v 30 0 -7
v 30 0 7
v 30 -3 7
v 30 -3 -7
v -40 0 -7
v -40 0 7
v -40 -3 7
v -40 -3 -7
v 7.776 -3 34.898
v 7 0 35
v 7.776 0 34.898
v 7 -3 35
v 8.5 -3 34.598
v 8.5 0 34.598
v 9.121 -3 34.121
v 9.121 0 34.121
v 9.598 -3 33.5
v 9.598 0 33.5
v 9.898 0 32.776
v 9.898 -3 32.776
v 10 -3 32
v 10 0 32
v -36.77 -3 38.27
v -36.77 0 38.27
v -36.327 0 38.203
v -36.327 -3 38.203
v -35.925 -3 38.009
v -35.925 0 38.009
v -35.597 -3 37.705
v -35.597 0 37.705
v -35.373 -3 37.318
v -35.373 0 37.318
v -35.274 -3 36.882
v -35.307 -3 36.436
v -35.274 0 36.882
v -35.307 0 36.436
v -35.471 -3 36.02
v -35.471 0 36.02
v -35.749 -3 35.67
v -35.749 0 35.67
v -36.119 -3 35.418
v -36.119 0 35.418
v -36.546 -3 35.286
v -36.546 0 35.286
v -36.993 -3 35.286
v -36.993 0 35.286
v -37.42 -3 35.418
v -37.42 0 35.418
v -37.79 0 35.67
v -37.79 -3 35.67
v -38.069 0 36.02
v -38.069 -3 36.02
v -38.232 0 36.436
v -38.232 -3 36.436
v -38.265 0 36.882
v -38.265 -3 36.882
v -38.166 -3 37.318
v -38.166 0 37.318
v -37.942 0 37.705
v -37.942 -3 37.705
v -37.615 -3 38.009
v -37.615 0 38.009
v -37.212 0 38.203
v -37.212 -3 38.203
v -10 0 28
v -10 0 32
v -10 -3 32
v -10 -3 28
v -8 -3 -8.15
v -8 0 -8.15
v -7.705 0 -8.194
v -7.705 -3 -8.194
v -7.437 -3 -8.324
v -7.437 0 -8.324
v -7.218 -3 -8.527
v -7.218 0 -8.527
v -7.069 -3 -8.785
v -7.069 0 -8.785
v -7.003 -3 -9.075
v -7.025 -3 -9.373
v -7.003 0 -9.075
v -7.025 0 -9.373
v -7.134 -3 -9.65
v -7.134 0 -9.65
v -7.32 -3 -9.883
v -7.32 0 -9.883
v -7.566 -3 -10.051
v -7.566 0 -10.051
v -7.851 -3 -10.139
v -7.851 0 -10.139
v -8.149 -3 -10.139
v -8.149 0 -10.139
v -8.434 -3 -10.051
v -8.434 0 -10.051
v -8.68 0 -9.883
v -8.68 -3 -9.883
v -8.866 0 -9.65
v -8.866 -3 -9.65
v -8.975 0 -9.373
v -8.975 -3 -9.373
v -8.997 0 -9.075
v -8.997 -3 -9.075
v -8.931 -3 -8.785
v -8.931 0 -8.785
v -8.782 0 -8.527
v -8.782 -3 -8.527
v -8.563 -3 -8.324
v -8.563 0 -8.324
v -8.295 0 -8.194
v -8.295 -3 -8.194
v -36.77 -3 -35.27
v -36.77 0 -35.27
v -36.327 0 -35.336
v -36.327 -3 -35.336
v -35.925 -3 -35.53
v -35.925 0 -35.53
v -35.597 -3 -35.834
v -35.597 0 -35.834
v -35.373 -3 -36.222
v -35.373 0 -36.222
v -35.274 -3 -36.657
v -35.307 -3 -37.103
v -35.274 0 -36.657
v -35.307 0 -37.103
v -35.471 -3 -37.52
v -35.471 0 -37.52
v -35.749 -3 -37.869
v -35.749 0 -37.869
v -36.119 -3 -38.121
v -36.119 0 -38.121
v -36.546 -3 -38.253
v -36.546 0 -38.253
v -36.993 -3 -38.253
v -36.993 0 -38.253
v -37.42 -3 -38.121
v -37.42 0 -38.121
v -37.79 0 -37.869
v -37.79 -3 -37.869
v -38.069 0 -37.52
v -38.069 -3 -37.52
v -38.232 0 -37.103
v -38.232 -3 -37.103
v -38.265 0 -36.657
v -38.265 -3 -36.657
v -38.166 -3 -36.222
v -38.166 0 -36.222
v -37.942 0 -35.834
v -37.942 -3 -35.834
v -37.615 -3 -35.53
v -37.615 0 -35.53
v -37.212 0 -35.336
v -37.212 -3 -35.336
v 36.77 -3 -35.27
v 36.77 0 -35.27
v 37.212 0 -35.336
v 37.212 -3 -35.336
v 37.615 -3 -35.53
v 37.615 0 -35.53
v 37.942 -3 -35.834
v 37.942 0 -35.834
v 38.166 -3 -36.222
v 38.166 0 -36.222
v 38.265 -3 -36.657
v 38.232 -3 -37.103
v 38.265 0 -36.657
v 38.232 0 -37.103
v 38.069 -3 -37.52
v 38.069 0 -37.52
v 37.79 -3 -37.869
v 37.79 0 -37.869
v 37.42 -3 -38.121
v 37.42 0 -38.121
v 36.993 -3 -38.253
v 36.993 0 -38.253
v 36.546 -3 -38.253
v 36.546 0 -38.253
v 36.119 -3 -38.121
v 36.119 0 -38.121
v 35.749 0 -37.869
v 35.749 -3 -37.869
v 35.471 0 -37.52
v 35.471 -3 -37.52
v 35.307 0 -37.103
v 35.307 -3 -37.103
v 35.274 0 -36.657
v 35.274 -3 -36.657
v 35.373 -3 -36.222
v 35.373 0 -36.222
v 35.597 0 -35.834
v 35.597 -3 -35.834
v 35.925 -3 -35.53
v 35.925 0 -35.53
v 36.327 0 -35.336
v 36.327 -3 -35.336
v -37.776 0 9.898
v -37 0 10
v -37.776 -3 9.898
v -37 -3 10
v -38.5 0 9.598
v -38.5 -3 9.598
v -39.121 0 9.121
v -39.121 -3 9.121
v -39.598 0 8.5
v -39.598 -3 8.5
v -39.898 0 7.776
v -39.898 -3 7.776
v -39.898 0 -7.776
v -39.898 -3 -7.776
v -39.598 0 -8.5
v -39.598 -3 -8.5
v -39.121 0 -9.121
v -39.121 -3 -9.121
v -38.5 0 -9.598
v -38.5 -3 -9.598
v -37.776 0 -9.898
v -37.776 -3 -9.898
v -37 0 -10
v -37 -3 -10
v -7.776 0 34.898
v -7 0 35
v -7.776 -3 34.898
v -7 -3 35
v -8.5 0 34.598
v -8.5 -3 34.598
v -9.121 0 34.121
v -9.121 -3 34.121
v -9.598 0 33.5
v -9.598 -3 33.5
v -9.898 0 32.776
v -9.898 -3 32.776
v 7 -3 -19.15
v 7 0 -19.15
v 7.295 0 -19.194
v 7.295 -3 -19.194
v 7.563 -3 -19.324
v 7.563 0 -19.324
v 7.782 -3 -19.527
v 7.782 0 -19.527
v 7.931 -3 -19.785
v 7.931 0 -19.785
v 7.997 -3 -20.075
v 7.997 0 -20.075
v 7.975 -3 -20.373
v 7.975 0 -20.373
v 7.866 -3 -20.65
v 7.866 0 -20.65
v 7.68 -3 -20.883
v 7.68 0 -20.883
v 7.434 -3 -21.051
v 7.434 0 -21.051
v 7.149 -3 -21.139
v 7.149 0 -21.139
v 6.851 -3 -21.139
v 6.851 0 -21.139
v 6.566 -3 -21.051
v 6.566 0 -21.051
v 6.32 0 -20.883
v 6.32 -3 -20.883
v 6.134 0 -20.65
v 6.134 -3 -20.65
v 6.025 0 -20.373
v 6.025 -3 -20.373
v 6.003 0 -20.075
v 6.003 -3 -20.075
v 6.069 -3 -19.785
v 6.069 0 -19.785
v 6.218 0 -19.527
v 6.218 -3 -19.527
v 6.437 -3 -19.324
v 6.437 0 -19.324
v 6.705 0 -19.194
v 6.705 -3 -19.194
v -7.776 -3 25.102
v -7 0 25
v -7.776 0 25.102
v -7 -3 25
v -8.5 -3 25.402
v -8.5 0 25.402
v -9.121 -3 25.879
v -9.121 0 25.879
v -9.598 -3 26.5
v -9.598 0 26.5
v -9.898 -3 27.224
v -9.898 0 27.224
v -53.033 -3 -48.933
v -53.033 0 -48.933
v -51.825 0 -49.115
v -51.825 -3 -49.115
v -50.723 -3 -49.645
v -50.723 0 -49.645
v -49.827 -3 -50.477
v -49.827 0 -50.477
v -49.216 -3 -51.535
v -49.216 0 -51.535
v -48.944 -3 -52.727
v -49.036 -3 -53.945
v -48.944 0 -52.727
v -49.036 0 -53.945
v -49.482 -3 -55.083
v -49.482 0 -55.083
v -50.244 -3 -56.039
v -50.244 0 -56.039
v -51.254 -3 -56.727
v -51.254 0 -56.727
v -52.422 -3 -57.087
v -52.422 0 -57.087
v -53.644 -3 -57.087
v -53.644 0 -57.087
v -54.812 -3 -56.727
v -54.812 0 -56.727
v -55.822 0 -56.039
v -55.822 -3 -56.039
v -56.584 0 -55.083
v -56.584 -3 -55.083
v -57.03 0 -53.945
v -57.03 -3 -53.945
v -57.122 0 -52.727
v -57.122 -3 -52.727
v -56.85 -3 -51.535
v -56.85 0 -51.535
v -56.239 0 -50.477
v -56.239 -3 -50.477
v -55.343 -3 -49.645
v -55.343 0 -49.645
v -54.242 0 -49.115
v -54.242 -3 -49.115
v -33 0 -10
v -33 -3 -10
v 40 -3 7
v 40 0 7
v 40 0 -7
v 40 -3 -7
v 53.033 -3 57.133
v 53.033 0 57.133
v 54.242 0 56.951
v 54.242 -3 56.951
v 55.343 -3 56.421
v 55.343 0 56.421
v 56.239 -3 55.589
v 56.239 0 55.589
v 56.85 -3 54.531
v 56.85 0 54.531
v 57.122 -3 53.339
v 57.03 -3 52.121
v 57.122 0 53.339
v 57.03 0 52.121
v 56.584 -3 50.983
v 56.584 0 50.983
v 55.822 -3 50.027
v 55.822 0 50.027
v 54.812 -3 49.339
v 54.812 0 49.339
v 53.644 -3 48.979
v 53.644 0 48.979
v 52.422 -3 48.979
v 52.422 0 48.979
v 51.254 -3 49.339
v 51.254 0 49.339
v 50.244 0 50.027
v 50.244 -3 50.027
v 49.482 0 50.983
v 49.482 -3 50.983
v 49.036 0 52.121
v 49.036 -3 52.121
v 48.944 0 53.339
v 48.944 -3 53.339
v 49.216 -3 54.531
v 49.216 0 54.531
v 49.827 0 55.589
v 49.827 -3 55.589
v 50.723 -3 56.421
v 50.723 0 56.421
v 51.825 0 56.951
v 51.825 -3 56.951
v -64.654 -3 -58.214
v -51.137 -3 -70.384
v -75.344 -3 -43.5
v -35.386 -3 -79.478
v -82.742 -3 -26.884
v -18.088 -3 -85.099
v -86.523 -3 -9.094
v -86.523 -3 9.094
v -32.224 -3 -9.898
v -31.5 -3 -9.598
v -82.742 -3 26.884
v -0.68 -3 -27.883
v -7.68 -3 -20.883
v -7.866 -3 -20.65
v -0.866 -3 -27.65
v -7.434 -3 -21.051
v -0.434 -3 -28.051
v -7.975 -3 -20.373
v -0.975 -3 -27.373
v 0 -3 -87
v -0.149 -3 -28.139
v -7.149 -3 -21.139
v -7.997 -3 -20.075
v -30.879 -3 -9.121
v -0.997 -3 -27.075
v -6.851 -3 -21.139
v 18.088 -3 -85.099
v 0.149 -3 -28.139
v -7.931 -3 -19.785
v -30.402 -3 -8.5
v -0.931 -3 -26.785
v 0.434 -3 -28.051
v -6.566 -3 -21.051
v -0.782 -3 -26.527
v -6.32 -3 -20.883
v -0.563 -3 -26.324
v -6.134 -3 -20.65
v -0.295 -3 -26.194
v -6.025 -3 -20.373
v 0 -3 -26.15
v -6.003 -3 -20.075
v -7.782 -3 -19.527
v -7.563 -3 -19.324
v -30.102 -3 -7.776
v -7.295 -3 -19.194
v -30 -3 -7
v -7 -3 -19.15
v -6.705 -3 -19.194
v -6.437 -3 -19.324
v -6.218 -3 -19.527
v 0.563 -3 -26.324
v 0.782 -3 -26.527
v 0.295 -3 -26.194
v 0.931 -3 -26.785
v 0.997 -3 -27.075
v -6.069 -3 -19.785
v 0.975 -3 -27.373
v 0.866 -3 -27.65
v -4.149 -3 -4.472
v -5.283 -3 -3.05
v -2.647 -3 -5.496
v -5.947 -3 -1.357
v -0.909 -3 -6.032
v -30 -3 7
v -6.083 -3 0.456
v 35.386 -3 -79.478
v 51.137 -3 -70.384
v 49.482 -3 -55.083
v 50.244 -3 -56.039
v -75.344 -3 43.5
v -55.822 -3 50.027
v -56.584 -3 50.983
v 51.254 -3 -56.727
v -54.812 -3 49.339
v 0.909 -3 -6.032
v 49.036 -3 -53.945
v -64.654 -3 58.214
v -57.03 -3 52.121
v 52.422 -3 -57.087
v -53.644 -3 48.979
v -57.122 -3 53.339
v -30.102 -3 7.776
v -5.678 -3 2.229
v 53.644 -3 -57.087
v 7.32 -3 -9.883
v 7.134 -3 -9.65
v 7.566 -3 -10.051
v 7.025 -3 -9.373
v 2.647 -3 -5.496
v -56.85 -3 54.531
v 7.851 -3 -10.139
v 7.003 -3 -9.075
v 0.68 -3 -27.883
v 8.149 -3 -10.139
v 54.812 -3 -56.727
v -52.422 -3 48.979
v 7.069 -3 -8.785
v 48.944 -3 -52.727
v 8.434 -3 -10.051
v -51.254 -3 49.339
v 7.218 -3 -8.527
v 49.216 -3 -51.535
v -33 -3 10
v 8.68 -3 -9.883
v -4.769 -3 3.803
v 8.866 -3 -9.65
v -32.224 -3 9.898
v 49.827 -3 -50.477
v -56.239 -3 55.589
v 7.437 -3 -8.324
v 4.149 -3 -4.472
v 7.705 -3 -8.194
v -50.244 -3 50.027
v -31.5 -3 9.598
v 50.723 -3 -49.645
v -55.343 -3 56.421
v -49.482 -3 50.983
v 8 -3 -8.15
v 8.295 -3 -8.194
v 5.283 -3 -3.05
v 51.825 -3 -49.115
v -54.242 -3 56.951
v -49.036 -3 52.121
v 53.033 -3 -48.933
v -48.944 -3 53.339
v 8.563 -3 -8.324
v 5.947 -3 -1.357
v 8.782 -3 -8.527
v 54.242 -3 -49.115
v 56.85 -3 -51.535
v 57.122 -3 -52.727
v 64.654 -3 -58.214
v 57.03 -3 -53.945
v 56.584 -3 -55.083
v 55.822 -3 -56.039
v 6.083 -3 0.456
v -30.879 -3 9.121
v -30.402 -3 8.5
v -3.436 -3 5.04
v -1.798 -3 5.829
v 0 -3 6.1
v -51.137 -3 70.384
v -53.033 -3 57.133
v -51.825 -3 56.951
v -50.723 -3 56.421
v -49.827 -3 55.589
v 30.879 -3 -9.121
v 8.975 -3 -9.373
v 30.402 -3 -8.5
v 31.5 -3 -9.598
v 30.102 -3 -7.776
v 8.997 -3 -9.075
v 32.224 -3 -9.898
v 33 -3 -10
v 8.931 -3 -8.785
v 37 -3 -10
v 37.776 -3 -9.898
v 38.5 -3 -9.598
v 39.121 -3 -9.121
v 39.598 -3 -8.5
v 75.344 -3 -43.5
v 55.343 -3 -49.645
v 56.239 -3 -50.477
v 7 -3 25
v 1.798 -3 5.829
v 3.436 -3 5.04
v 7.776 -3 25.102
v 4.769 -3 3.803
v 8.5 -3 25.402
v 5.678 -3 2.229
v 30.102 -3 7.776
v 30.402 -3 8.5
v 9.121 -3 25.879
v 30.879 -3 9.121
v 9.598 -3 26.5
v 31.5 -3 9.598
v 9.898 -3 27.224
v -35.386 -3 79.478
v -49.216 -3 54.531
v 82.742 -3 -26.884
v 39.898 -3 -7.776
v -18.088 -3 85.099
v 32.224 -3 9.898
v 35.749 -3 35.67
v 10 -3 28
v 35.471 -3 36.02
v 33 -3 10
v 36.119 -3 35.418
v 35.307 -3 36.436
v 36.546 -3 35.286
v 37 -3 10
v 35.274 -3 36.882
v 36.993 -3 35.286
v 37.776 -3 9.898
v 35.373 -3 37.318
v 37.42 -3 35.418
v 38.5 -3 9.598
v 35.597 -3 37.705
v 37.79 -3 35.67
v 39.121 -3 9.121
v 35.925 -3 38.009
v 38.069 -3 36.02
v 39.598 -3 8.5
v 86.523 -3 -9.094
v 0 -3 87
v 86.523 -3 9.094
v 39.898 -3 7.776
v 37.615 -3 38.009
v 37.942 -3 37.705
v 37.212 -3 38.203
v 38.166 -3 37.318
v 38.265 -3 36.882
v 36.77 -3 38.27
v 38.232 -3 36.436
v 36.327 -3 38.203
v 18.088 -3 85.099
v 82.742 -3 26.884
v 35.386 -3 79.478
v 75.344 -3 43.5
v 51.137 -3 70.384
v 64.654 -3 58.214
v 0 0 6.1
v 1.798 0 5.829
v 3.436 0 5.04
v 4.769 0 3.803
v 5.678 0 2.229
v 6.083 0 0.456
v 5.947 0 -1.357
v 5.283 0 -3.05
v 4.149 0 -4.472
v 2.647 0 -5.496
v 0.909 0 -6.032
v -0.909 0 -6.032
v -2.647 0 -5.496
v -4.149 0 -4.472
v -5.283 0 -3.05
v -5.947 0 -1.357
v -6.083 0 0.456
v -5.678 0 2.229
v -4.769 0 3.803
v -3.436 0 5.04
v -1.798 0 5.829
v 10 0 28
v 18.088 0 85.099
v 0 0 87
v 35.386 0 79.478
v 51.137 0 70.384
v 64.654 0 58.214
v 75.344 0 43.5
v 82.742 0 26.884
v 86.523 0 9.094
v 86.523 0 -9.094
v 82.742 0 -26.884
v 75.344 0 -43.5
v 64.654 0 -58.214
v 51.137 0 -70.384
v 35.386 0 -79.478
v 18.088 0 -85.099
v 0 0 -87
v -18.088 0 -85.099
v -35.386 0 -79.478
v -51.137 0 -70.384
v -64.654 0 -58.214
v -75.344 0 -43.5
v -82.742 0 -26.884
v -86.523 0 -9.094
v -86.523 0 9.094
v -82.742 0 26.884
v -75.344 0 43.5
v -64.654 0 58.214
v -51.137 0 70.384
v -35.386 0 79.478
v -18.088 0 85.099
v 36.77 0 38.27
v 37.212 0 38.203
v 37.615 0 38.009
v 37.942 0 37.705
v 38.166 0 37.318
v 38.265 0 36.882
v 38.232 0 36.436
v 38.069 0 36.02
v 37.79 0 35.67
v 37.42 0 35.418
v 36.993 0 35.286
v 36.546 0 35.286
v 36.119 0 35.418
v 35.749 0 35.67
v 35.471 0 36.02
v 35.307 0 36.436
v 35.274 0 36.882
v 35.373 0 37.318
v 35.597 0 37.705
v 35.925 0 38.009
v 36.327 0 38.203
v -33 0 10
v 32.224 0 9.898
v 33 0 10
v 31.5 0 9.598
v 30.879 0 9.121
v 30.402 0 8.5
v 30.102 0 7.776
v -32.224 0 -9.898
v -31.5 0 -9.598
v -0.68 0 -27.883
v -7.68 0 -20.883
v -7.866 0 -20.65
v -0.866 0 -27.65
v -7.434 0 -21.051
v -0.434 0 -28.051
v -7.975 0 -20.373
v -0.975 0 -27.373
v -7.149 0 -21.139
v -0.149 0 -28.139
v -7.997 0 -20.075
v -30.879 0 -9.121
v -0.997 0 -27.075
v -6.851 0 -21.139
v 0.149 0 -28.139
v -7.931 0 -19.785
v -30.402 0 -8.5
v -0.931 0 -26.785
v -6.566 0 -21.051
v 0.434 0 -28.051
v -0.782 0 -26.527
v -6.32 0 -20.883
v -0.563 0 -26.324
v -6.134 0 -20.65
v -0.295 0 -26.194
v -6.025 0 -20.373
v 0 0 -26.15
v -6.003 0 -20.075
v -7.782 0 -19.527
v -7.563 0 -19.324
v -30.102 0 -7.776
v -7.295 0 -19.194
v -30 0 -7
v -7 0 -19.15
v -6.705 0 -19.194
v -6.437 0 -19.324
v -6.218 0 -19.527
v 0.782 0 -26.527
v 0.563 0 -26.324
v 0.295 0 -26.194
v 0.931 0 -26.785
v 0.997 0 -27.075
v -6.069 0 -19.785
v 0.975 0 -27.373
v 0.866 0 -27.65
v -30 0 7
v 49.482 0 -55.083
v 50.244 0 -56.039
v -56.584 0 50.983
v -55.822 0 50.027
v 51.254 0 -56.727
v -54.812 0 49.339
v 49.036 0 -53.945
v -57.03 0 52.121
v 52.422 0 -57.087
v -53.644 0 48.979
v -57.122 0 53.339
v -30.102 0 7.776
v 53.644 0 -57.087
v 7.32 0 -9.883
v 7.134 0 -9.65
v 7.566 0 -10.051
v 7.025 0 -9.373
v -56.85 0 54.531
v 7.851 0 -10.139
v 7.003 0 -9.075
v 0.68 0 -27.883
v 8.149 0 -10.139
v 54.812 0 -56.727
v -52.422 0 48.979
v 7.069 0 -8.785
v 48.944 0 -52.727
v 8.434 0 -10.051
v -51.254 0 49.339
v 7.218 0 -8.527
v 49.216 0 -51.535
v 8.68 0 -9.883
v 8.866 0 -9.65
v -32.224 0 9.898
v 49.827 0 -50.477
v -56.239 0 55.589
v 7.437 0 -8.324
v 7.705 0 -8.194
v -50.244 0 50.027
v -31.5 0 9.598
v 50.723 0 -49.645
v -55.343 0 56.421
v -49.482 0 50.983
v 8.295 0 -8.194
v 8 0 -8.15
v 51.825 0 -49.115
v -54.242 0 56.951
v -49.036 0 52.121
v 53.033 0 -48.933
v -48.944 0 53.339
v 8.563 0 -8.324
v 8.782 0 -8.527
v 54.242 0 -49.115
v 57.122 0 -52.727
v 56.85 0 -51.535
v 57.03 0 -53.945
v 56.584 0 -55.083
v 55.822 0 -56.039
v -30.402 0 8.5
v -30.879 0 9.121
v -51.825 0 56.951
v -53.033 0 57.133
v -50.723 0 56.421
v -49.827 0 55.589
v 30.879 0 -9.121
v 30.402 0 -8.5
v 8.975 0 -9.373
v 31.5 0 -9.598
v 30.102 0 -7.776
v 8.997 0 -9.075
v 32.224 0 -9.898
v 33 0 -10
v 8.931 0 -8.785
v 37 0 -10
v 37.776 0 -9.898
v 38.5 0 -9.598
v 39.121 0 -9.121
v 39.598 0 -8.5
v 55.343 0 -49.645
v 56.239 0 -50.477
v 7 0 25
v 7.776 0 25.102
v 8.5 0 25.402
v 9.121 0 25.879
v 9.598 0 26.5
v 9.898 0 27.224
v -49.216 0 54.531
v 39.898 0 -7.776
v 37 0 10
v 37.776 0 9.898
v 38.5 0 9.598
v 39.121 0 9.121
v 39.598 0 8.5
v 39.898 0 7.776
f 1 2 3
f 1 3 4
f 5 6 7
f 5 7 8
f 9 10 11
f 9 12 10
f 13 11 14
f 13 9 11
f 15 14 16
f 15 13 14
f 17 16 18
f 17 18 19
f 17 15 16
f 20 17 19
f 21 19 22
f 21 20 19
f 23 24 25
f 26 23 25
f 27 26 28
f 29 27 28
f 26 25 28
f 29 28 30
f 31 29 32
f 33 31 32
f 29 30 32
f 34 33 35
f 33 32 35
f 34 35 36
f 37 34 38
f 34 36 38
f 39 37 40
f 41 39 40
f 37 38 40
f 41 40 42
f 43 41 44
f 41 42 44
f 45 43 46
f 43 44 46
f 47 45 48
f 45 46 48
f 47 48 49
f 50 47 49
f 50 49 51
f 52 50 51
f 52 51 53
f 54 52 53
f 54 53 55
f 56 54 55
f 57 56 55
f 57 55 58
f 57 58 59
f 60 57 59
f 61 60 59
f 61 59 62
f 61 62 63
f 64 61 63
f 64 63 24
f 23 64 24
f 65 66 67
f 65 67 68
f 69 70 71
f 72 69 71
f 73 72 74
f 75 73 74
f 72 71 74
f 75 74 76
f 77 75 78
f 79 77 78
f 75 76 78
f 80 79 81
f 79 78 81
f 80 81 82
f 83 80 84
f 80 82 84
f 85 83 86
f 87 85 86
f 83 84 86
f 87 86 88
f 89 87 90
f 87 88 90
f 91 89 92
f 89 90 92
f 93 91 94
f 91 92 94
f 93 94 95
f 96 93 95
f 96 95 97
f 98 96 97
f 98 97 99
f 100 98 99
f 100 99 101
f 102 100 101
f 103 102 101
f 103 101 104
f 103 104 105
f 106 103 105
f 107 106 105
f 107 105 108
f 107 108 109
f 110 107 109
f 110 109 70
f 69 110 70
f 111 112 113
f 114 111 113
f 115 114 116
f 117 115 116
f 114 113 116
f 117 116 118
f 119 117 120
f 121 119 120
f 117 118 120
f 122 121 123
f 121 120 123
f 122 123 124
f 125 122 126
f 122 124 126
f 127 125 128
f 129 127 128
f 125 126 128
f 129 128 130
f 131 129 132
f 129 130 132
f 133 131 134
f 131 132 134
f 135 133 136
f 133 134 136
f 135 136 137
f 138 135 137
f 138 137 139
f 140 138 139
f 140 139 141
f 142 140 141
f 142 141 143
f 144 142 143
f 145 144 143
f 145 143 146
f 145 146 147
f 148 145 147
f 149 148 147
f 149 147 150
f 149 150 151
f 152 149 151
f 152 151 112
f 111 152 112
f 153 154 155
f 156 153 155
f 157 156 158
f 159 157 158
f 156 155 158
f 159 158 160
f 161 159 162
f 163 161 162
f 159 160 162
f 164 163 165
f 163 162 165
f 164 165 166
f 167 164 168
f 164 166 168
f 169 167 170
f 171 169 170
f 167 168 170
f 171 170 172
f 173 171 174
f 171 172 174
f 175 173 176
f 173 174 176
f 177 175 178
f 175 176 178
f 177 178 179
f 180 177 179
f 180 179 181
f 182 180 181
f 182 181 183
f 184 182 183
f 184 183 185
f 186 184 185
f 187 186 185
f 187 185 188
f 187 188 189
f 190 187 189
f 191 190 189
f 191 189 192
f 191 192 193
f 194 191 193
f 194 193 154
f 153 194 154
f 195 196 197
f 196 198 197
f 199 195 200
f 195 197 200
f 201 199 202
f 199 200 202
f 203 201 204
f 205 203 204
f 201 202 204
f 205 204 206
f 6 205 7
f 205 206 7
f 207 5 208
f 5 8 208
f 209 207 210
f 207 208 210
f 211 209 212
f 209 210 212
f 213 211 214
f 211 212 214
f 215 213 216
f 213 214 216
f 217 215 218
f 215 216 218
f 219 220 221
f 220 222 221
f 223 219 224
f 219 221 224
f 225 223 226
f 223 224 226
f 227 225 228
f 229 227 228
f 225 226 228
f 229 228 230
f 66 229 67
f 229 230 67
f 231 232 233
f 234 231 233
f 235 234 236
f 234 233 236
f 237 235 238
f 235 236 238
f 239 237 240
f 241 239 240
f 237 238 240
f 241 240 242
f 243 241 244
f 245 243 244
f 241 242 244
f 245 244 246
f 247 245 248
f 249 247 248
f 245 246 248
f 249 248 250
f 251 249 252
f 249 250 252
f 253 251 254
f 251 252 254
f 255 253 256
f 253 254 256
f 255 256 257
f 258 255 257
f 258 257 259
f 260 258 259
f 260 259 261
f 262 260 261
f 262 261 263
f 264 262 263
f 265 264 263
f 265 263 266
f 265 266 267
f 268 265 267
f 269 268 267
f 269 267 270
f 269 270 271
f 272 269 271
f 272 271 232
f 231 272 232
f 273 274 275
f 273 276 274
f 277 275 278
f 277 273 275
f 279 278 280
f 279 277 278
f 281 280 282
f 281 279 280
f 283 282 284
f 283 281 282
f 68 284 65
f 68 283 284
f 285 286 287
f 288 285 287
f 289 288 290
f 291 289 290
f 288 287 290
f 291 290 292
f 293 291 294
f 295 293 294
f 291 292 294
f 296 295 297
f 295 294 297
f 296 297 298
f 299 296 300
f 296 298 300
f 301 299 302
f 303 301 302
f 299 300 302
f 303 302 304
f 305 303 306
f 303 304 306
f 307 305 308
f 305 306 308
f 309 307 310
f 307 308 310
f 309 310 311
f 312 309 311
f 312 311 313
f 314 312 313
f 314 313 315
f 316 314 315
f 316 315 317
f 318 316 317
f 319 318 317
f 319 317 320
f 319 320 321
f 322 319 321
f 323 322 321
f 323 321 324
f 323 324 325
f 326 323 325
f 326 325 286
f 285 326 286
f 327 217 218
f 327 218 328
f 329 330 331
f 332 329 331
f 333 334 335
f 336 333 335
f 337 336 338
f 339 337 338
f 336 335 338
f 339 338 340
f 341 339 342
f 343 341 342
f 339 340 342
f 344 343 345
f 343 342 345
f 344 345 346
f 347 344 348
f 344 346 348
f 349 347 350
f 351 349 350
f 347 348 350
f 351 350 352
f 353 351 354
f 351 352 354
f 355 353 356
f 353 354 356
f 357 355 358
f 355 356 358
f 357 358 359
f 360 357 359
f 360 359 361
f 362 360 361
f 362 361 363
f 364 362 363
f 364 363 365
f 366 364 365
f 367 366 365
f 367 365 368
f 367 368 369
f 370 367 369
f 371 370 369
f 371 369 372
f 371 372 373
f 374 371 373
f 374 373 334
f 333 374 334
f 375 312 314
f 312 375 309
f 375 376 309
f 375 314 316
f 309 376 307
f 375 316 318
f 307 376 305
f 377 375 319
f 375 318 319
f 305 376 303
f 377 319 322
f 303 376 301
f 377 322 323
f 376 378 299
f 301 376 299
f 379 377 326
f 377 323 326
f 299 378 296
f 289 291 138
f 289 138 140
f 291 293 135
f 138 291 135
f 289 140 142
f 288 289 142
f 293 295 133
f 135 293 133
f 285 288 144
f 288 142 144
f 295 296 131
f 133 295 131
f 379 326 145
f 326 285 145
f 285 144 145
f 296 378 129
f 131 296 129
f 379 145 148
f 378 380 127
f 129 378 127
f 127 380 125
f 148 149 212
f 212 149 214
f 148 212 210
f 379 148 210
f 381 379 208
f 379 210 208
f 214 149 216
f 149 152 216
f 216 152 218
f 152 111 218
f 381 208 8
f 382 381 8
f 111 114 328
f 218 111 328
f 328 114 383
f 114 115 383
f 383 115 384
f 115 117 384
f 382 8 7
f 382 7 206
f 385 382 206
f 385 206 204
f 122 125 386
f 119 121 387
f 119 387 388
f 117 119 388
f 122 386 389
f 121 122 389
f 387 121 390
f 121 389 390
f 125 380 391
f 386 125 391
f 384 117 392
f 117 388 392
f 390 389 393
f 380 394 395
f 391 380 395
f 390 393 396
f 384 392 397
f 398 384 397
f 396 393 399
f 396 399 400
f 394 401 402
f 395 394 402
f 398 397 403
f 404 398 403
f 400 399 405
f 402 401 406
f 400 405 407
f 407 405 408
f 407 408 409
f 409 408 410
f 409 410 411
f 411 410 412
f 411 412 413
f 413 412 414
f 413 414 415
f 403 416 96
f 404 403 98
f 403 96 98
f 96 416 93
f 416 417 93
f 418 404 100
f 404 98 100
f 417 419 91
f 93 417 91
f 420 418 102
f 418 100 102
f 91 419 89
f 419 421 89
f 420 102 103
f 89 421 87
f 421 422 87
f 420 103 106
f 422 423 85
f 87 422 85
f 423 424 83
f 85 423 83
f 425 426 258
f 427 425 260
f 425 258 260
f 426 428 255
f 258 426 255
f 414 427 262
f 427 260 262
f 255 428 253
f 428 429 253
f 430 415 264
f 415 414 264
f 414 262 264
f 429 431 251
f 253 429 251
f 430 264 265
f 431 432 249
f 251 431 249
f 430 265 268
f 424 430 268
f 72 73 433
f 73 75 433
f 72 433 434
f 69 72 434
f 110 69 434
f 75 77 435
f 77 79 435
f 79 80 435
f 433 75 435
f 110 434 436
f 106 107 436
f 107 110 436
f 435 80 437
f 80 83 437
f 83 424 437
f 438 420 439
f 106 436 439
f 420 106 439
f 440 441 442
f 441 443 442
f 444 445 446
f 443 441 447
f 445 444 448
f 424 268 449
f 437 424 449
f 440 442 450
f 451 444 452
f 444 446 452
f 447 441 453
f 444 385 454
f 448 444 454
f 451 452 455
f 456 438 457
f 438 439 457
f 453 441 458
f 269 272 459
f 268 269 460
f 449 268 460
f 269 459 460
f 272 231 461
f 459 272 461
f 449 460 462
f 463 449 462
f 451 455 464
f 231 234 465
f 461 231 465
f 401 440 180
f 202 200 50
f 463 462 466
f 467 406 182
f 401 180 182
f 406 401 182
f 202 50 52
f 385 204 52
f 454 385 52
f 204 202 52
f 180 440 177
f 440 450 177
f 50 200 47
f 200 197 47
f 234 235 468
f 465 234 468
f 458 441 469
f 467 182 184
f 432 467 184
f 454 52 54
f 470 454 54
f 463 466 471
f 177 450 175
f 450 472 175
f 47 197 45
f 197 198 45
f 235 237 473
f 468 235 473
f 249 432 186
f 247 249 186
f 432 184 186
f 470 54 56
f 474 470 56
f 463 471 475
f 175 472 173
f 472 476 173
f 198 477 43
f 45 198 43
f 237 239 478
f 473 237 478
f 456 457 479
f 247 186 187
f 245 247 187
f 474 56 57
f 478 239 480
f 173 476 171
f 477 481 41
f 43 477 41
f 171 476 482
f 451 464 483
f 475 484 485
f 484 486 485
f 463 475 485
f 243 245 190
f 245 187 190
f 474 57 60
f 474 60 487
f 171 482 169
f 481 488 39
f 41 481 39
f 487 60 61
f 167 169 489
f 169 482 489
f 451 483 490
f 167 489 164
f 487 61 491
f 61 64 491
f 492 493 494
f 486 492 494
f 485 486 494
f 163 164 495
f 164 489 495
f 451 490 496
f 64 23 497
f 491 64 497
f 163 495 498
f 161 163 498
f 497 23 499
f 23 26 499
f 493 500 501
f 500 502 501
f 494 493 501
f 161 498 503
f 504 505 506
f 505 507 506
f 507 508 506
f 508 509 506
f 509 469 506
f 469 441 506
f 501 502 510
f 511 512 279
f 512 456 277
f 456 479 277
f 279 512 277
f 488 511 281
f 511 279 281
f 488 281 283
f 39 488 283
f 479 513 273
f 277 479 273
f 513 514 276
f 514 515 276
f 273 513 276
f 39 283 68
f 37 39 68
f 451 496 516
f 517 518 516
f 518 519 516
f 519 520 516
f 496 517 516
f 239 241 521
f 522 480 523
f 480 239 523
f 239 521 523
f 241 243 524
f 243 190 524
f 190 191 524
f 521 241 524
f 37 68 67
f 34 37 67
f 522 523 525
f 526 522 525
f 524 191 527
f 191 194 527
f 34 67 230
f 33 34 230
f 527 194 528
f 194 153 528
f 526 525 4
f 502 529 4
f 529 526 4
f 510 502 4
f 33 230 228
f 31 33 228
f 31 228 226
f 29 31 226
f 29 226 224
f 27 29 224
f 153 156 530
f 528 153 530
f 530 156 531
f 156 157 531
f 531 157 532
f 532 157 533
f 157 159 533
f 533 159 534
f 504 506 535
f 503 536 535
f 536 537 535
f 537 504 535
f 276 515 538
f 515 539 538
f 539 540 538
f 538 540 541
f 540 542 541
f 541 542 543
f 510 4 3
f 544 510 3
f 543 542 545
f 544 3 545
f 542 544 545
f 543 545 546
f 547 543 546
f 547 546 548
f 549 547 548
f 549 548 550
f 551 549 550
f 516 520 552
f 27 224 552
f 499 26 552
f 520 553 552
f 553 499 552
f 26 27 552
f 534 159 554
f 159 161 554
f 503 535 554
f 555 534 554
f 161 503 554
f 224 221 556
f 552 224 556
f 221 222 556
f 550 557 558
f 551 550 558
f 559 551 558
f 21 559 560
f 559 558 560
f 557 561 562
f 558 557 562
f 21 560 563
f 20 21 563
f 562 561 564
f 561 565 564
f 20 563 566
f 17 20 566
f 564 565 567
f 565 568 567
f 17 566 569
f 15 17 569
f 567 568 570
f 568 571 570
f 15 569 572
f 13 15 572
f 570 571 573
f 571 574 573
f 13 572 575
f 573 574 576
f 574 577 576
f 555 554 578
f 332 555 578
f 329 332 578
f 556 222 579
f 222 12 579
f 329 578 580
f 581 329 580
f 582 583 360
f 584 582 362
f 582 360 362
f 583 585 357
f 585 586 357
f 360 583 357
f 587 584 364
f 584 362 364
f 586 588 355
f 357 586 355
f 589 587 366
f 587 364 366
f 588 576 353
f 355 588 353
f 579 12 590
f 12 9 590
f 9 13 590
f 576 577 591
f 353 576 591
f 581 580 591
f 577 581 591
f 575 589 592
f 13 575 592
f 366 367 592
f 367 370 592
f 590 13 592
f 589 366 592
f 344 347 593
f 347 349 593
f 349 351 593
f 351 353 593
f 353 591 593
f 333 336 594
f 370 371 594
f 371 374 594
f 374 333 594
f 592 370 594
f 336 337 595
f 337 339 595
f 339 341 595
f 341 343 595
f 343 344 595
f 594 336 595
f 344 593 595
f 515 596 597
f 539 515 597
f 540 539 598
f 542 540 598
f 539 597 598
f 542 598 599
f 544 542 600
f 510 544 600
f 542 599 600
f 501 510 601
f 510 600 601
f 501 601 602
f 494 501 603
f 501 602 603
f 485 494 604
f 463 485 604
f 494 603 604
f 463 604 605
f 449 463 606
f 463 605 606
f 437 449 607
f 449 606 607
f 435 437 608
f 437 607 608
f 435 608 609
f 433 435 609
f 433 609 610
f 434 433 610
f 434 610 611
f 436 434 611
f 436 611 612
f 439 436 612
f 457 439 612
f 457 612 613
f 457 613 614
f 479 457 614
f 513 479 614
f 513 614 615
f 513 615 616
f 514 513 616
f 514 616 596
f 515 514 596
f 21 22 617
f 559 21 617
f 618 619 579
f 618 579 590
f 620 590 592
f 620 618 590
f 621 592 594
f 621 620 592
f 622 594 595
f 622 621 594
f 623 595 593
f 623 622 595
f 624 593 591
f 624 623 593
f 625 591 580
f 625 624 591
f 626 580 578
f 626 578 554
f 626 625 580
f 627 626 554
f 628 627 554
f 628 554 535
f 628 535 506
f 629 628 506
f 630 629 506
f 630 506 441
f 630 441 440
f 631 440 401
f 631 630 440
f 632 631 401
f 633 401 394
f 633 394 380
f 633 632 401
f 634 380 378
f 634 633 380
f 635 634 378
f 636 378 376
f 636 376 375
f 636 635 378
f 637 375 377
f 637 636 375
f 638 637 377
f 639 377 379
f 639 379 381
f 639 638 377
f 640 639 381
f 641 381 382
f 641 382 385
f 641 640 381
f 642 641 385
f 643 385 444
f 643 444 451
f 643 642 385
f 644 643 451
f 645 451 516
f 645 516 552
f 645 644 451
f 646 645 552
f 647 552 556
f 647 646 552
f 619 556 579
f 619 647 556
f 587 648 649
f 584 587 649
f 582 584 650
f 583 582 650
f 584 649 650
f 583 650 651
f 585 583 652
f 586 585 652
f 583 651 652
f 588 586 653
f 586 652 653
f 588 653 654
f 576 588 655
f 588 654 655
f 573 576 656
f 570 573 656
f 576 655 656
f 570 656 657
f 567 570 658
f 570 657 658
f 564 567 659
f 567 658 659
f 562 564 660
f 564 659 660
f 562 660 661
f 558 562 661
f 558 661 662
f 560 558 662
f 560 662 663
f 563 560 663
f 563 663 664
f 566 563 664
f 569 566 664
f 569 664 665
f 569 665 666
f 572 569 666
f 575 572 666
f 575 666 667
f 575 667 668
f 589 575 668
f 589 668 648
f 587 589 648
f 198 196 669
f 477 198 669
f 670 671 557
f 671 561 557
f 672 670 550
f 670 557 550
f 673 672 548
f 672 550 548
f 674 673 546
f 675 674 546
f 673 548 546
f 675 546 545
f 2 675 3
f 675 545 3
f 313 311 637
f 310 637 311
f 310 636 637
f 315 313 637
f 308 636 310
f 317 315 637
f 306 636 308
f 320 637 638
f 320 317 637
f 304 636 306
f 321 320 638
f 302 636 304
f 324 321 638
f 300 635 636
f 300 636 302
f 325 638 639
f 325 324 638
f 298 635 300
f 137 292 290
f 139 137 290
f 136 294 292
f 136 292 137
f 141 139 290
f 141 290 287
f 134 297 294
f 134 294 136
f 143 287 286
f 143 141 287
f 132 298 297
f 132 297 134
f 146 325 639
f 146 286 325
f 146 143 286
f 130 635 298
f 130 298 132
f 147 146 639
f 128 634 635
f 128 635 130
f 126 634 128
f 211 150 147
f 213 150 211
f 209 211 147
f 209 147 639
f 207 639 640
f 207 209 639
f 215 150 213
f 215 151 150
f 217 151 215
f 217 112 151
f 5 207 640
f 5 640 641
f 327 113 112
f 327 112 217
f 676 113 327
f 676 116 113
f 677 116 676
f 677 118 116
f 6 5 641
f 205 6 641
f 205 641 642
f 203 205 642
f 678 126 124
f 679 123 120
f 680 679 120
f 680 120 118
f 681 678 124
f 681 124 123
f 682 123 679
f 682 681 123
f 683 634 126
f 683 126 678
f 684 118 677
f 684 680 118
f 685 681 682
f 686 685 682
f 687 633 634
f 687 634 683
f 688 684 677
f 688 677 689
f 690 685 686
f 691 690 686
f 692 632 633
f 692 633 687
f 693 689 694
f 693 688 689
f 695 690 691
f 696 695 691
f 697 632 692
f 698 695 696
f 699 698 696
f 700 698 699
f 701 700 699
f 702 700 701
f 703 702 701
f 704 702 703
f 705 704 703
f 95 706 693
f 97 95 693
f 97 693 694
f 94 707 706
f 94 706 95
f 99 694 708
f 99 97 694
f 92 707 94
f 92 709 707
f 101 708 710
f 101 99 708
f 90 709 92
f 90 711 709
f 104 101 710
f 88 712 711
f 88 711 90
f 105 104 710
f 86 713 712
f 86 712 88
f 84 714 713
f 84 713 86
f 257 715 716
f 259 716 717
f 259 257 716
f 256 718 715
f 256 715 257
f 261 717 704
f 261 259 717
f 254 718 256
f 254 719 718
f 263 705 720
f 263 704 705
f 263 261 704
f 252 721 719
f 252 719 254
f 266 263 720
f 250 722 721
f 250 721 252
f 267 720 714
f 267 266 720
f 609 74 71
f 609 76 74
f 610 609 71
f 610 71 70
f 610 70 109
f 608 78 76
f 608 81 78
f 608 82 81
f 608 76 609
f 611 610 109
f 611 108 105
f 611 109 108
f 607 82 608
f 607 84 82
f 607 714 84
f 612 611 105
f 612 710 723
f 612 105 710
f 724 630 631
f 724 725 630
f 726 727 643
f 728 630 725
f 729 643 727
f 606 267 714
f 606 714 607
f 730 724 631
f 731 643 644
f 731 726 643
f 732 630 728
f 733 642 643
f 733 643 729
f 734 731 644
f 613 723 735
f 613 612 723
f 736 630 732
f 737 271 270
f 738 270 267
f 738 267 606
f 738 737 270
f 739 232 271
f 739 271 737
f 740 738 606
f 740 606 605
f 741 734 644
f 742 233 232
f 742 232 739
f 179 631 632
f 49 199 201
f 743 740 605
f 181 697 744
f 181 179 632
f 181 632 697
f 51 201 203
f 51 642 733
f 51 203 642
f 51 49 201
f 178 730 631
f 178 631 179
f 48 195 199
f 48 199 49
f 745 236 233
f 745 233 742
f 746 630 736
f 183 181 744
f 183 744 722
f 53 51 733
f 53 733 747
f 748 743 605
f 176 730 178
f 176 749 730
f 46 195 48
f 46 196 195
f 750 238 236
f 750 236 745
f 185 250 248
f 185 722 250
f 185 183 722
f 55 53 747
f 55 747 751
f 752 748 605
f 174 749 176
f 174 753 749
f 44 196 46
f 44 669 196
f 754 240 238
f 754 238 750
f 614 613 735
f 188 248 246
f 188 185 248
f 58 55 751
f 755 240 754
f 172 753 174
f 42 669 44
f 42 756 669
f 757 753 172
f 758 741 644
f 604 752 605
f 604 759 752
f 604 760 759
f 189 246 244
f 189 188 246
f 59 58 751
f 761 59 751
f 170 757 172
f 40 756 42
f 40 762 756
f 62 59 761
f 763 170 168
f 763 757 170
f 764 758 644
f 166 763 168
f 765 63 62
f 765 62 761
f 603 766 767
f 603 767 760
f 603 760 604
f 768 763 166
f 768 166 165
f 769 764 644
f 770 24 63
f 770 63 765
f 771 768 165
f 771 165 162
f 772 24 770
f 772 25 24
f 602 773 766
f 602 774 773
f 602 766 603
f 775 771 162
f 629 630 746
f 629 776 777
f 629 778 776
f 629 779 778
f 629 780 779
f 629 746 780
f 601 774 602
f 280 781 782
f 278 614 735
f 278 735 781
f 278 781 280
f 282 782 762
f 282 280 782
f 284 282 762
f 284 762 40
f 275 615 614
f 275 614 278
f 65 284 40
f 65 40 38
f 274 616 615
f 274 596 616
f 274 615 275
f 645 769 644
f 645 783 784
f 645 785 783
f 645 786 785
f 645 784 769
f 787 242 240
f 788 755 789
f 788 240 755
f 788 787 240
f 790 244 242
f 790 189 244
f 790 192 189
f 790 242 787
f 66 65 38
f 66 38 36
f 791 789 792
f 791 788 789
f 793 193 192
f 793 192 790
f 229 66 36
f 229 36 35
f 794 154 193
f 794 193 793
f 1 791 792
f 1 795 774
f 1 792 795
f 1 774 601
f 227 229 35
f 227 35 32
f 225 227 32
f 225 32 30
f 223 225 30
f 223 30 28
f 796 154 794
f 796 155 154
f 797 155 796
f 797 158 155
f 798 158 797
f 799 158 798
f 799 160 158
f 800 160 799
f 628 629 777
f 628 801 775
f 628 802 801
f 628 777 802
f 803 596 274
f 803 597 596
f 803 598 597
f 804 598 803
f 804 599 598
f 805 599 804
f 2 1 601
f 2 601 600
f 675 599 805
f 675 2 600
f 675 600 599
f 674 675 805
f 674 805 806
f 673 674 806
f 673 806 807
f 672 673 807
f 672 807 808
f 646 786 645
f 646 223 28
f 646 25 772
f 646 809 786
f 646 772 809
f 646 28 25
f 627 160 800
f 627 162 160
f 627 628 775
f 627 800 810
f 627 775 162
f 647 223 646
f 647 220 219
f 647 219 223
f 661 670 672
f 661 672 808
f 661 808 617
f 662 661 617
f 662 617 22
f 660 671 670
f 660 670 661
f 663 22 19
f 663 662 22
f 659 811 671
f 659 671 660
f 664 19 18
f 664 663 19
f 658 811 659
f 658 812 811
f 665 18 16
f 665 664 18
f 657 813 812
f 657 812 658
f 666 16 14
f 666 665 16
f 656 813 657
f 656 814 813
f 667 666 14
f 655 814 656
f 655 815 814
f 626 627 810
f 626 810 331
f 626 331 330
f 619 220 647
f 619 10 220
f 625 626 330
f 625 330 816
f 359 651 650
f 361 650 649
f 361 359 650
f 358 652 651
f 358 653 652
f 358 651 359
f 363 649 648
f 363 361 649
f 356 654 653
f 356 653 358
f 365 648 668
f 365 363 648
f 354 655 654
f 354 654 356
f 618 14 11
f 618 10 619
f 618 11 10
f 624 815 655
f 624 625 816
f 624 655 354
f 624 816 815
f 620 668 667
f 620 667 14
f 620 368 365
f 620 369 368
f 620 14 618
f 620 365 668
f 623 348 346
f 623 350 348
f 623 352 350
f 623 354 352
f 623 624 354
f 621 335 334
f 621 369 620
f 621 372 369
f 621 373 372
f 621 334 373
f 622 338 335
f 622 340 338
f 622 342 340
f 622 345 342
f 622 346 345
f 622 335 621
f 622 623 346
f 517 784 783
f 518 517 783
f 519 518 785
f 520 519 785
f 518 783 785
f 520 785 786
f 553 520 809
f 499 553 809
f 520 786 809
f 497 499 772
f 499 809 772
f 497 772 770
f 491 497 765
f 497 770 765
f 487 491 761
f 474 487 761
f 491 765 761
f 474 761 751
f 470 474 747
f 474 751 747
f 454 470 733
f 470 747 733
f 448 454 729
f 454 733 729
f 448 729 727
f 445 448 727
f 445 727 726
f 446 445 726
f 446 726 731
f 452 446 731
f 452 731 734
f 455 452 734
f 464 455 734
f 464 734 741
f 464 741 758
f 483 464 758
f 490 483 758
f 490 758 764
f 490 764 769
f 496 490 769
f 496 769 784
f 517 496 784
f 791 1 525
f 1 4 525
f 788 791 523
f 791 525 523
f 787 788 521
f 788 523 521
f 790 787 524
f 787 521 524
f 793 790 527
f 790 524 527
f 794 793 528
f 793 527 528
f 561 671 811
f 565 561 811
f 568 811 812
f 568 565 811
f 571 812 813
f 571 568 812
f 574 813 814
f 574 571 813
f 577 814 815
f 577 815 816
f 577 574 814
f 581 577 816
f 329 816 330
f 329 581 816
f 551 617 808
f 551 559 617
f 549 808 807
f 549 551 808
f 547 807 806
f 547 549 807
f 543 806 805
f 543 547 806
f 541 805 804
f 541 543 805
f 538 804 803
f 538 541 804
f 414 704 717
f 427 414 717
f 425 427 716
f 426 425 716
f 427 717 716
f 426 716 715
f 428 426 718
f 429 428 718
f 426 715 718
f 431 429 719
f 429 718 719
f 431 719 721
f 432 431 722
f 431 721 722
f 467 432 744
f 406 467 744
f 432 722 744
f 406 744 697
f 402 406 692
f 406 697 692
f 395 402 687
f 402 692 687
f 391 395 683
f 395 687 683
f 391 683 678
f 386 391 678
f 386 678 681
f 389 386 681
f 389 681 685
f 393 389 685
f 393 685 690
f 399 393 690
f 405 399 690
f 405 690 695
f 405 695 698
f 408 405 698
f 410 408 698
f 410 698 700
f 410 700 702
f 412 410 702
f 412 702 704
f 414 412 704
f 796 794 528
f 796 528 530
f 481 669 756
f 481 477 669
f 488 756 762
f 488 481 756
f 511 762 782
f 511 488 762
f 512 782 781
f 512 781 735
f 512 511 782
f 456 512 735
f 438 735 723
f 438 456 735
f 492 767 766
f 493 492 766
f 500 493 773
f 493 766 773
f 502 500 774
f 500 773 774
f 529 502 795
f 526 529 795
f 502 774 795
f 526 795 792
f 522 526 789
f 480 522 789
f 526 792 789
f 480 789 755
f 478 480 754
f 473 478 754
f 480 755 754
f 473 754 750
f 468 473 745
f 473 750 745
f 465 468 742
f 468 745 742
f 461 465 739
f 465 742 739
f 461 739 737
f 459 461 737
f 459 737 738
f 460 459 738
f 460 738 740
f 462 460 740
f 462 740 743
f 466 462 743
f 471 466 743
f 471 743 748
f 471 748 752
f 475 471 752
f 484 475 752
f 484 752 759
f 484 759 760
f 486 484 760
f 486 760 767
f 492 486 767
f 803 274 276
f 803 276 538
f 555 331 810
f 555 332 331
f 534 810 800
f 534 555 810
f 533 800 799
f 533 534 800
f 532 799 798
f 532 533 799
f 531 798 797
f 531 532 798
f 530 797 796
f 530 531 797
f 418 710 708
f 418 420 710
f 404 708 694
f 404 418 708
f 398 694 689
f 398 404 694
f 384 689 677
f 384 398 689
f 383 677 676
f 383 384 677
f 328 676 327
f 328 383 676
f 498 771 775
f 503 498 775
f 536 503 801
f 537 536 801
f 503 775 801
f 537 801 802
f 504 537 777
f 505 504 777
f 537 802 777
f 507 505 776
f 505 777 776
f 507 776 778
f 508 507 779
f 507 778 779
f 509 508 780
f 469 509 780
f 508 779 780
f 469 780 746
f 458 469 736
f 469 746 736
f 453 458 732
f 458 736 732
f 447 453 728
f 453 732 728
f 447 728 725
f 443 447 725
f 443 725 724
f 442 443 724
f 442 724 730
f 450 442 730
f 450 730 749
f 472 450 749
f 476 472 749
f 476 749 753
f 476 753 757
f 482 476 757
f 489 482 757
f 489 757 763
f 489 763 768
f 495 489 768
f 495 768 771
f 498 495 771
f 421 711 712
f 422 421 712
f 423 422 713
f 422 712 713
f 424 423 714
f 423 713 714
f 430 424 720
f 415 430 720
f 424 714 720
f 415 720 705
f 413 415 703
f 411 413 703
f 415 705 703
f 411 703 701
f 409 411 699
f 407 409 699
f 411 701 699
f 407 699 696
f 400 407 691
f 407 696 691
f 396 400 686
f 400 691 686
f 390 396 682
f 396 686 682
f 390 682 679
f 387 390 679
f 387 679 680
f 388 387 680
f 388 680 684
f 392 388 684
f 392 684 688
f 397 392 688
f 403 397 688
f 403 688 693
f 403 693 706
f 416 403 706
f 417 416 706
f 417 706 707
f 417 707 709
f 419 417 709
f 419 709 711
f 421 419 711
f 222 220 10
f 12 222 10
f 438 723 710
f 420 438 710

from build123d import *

# Parameters (mm, degrees)
SKETCH_1_R             = 87
SM_BASE_FLANGE_1_DEPTH = 3
CUT_EXTRUDE_1_REACH    = 125.073
SKETCH_6_R             = 6.1
SKETCH_6_R_2           = 1
SKETCH_6_R_3           = 4.1
SKETCH_6_R_4           = 1.5
SKETCH_6_W             = 10
SKETCH_6_H             = 20
SKETCH_6_W_2           = 20
SKETCH_6_H_2           = 10
FILLET_1_R             = 3


# Sheet-metal steps are written as plain solids
with BuildPart() as part:
    # Sketch 1 → 基体-法兰1 (new body)
    with BuildSketch(Plane(origin=(0, 0, 0), x_dir=(1, 0, 0), z_dir=(0, 1, 0))):
        with Locations(Location((0, 0, 0), (0, 0, 270))):
            Circle(SKETCH_1_R)
    extrude(amount=-SM_BASE_FLANGE_1_DEPTH)

    # 草图6 → 切除-拉伸1 (cut, up to next)
    with BuildSketch(Plane(origin=(0, 0, 0), x_dir=(1, 0, 0), z_dir=(0, 1, 0)), mode=Mode.PRIVATE) as cut_extrude_1_sk1:
        with Locations(Location((0, 0, 0), (0, 0, 270))):
            Circle(SKETCH_6_R)
    cut_extrude_1_tool1 = extrude(cut_extrude_1_sk1.sketch, amount=-CUT_EXTRUDE_1_REACH, mode=Mode.PRIVATE) & part.part
    # 草图6 → 切除-拉伸1 (cut, up to next)
    with BuildSketch(Plane(origin=(0, 0, 0), x_dir=(1, 0, 0), z_dir=(0, 1, 0)), mode=Mode.PRIVATE) as cut_extrude_1_sk2:
        with Locations(Location((-8, 9.15, 0), (0, 0, 270))):
            Circle(SKETCH_6_R_2)
    cut_extrude_1_tool2 = extrude(cut_extrude_1_sk2.sketch, amount=-CUT_EXTRUDE_1_REACH, mode=Mode.PRIVATE) & part.part
    # 草图6 → 切除-拉伸1 (cut, up to next)
    with BuildSketch(Plane(origin=(0, 0, 0), x_dir=(1, 0, 0), z_dir=(0, 1, 0)), mode=Mode.PRIVATE) as cut_extrude_1_sk3:
        with Locations(Location((-7, 20.15, 0), (0, 0, 270))):
            Circle(SKETCH_6_R_2)
    cut_extrude_1_tool3 = extrude(cut_extrude_1_sk3.sketch, amount=-CUT_EXTRUDE_1_REACH, mode=Mode.PRIVATE) & part.part
    # 草图6 → 切除-拉伸1 (cut, up to next)
    with BuildSketch(Plane(origin=(0, 0, 0), x_dir=(1, 0, 0), z_dir=(0, 1, 0)), mode=Mode.PRIVATE) as cut_extrude_1_sk4:
        with Locations(Location((53.033008589, 53.033008589, 0), (0, 0, 270))):
            Circle(SKETCH_6_R_3)
    cut_extrude_1_tool4 = extrude(cut_extrude_1_sk4.sketch, amount=-CUT_EXTRUDE_1_REACH, mode=Mode.PRIVATE) & part.part
    # 草图6 → 切除-拉伸1 (cut, up to next)
    with BuildSketch(Plane(origin=(0, 0, 0), x_dir=(1, 0, 0), z_dir=(0, 1, 0)), mode=Mode.PRIVATE) as cut_extrude_1_sk5:
        with Locations(Location((-53.033008589, 53.033008589, 0), (0, 0, 270))):
            Circle(SKETCH_6_R_3)
    cut_extrude_1_tool5 = extrude(cut_extrude_1_sk5.sketch, amount=-CUT_EXTRUDE_1_REACH, mode=Mode.PRIVATE) & part.part
    # 草图6 → 切除-拉伸1 (cut, up to next)
    with BuildSketch(Plane(origin=(0, 0, 0), x_dir=(1, 0, 0), z_dir=(0, 1, 0)), mode=Mode.PRIVATE) as cut_extrude_1_sk6:
        with Locations(Location((53.033008589, -53.033008589, 0), (0, 0, 270))):
            Circle(SKETCH_6_R_3)
    cut_extrude_1_tool6 = extrude(cut_extrude_1_sk6.sketch, amount=-CUT_EXTRUDE_1_REACH, mode=Mode.PRIVATE) & part.part
    # 草图6 → 切除-拉伸1 (cut, up to next)
    with BuildSketch(Plane(origin=(0, 0, 0), x_dir=(1, 0, 0), z_dir=(0, 1, 0)), mode=Mode.PRIVATE) as cut_extrude_1_sk7:
        with Locations(Location((-53.033008589, -53.033008589, 0), (0, 0, 270))):
            Circle(SKETCH_6_R_3)
    cut_extrude_1_tool7 = extrude(cut_extrude_1_sk7.sketch, amount=-CUT_EXTRUDE_1_REACH, mode=Mode.PRIVATE) & part.part
    # 草图6 → 切除-拉伸1 (cut, up to next)
    with BuildSketch(Plane(origin=(0, 0, 0), x_dir=(1, 0, 0), z_dir=(0, 1, 0)), mode=Mode.PRIVATE) as cut_extrude_1_sk8:
        with Locations(Location((8, 9.15, 0), (0, 0, 270))):
            Circle(SKETCH_6_R_2)
    cut_extrude_1_tool8 = extrude(cut_extrude_1_sk8.sketch, amount=-CUT_EXTRUDE_1_REACH, mode=Mode.PRIVATE) & part.part
    # 草图6 → 切除-拉伸1 (cut, up to next)
    with BuildSketch(Plane(origin=(0, 0, 0), x_dir=(1, 0, 0), z_dir=(0, 1, 0)), mode=Mode.PRIVATE) as cut_extrude_1_sk9:
        with Locations(Location((7, 20.15, 0), (0, 0, 270))):
            Circle(SKETCH_6_R_2)
    cut_extrude_1_tool9 = extrude(cut_extrude_1_sk9.sketch, amount=-CUT_EXTRUDE_1_REACH, mode=Mode.PRIVATE) & part.part
    # 草图6 → 切除-拉伸1 (cut, up to next)
    with BuildSketch(Plane(origin=(0, 0, 0), x_dir=(1, 0, 0), z_dir=(0, 1, 0)), mode=Mode.PRIVATE) as cut_extrude_1_sk10:
        with Locations(Location((0, 27.15, 0), (0, 0, 270))):
            Circle(SKETCH_6_R_2)
    cut_extrude_1_tool10 = extrude(cut_extrude_1_sk10.sketch, amount=-CUT_EXTRUDE_1_REACH, mode=Mode.PRIVATE) & part.part
    # 草图6 → 切除-拉伸1 (cut, up to next)
    with BuildSketch(Plane(origin=(0, 0, 0), x_dir=(1, 0, 0), z_dir=(0, 1, 0)), mode=Mode.PRIVATE) as cut_extrude_1_sk11:
        with Locations(Location((-36.769552622, -36.769552622, 0), (0, 0, 270))):
            Circle(SKETCH_6_R_4)
    cut_extrude_1_tool11 = extrude(cut_extrude_1_sk11.sketch, amount=-CUT_EXTRUDE_1_REACH, mode=Mode.PRIVATE) & part.part
    # 草图6 → 切除-拉伸1 (cut, up to next)
    with BuildSketch(Plane(origin=(0, 0, 0), x_dir=(1, 0, 0), z_dir=(0, 1, 0)), mode=Mode.PRIVATE) as cut_extrude_1_sk12:
        with Locations(Location((-36.769552622, 36.769552622, 0), (0, 0, 270))):
            Circle(SKETCH_6_R_4)
    cut_extrude_1_tool12 = extrude(cut_extrude_1_sk12.sketch, amount=-CUT_EXTRUDE_1_REACH, mode=Mode.PRIVATE) & part.part
    # 草图6 → 切除-拉伸1 (cut, up to next)
    with BuildSketch(Plane(origin=(0, 0, 0), x_dir=(1, 0, 0), z_dir=(0, 1, 0)), mode=Mode.PRIVATE) as cut_extrude_1_sk13:
        with Locations(Location((36.769552622, 36.769552622, 0), (0, 0, 270))):
            Circle(SKETCH_6_R_4)
    cut_extrude_1_tool13 = extrude(cut_extrude_1_sk13.sketch, amount=-CUT_EXTRUDE_1_REACH, mode=Mode.PRIVATE) & part.part
    # 草图6 → 切除-拉伸1 (cut, up to next)
    with BuildSketch(Plane(origin=(0, 0, 0), x_dir=(1, 0, 0), z_dir=(0, 1, 0)), mode=Mode.PRIVATE) as cut_extrude_1_sk14:
        with Locations(Location((36.769552622, -36.769552622, 0), (0, 0, 270))):
            Circle(SKETCH_6_R_4)
    cut_extrude_1_tool14 = extrude(cut_extrude_1_sk14.sketch, amount=-CUT_EXTRUDE_1_REACH, mode=Mode.PRIVATE) & part.part
    # 草图6 → 切除-拉伸1 (cut, up to next)
    with BuildSketch(Plane(origin=(0, 0, 0), x_dir=(1, 0, 0), z_dir=(0, 1, 0)), mode=Mode.PRIVATE) as cut_extrude_1_sk15:
        with Locations((-35, 0)):
            Rectangle(SKETCH_6_W, SKETCH_6_H)
    cut_extrude_1_tool15 = extrude(cut_extrude_1_sk15.sketch, amount=-CUT_EXTRUDE_1_REACH, mode=Mode.PRIVATE) & part.part
    # 草图6 → 切除-拉伸1 (cut, up to next)
    with BuildSketch(Plane(origin=(0, 0, 0), x_dir=(1, 0, 0), z_dir=(0, 1, 0)), mode=Mode.PRIVATE) as cut_extrude_1_sk16:
        with Locations((35, 0)):
            Rectangle(SKETCH_6_W, SKETCH_6_H)
    cut_extrude_1_tool16 = extrude(cut_extrude_1_sk16.sketch, amount=-CUT_EXTRUDE_1_REACH, mode=Mode.PRIVATE) & part.part
    # 草图6 → 切除-拉伸1 (cut, up to next)
    with BuildSketch(Plane(origin=(0, 0, 0), x_dir=(1, 0, 0), z_dir=(0, 1, 0)), mode=Mode.PRIVATE) as cut_extrude_1_sk17:
        with Locations((0, -30)):
            Rectangle(SKETCH_6_W_2, SKETCH_6_H_2)
    cut_extrude_1_tool17 = extrude(cut_extrude_1_sk17.sketch, amount=-CUT_EXTRUDE_1_REACH, mode=Mode.PRIVATE) & part.part
    add(cut_extrude_1_tool1.solids().sort_by_distance((0, 0, 0))[0], mode=Mode.SUBTRACT)
    add(cut_extrude_1_tool2.solids().sort_by_distance((-8, 0, -9.15))[0], mode=Mode.SUBTRACT)
    add(cut_extrude_1_tool3.solids().sort_by_distance((-7, 0, -20.15))[0], mode=Mode.SUBTRACT)
    add(cut_extrude_1_tool4.solids().sort_by_distance((53.033009, 0, -53.033009))[0], mode=Mode.SUBTRACT)
    add(cut_extrude_1_tool5.solids().sort_by_distance((-53.033009, 0, -53.033009))[0], mode=Mode.SUBTRACT)
    add(cut_extrude_1_tool6.solids().sort_by_distance((53.033009, 0, 53.033009))[0], mode=Mode.SUBTRACT)
    add(cut_extrude_1_tool7.solids().sort_by_distance((-53.033009, 0, 53.033009))[0], mode=Mode.SUBTRACT)
    add(cut_extrude_1_tool8.solids().sort_by_distance((8, 0, -9.15))[0], mode=Mode.SUBTRACT)
    add(cut_extrude_1_tool9.solids().sort_by_distance((7, 0, -20.15))[0], mode=Mode.SUBTRACT)
    add(cut_extrude_1_tool10.solids().sort_by_distance((0, 0, -27.15))[0], mode=Mode.SUBTRACT)
    add(cut_extrude_1_tool11.solids().sort_by_distance((-36.769553, 0, 36.769553))[0], mode=Mode.SUBTRACT)
    add(cut_extrude_1_tool12.solids().sort_by_distance((-36.769553, 0, -36.769553))[0], mode=Mode.SUBTRACT)
    add(cut_extrude_1_tool13.solids().sort_by_distance((36.769553, 0, -36.769553))[0], mode=Mode.SUBTRACT)
    add(cut_extrude_1_tool14.solids().sort_by_distance((36.769553, 0, 36.769553))[0], mode=Mode.SUBTRACT)
    add(cut_extrude_1_tool15.solids().sort_by_distance((-35, 0, 0))[0], mode=Mode.SUBTRACT)
    add(cut_extrude_1_tool16.solids().sort_by_distance((35, 0, 0))[0], mode=Mode.SUBTRACT)
    add(cut_extrude_1_tool17.solids().sort_by_distance((0, 0, 30))[0], mode=Mode.SUBTRACT)

    # 圆角1
    fillet_1_edges = [part.edges().sort_by_distance(p)[0] for p in [
        (-10, -1.5, 35),
        (-10, -1.5, 25),
        (10, -1.5, 25),
        (10, -1.5, 35),
        (-30, -1.5, -10),
        (-30, -1.5, 10),
        (-40, -1.5, 10),
        (-40, -1.5, -10),
        (40, -1.5, -10),
        (40, -1.5, 10),
        (30, -1.5, 10),
        (30, -1.5, -10),
    ]]
    fillet(fillet_1_edges, radius=FILLET_1_R)


solid = part.part
